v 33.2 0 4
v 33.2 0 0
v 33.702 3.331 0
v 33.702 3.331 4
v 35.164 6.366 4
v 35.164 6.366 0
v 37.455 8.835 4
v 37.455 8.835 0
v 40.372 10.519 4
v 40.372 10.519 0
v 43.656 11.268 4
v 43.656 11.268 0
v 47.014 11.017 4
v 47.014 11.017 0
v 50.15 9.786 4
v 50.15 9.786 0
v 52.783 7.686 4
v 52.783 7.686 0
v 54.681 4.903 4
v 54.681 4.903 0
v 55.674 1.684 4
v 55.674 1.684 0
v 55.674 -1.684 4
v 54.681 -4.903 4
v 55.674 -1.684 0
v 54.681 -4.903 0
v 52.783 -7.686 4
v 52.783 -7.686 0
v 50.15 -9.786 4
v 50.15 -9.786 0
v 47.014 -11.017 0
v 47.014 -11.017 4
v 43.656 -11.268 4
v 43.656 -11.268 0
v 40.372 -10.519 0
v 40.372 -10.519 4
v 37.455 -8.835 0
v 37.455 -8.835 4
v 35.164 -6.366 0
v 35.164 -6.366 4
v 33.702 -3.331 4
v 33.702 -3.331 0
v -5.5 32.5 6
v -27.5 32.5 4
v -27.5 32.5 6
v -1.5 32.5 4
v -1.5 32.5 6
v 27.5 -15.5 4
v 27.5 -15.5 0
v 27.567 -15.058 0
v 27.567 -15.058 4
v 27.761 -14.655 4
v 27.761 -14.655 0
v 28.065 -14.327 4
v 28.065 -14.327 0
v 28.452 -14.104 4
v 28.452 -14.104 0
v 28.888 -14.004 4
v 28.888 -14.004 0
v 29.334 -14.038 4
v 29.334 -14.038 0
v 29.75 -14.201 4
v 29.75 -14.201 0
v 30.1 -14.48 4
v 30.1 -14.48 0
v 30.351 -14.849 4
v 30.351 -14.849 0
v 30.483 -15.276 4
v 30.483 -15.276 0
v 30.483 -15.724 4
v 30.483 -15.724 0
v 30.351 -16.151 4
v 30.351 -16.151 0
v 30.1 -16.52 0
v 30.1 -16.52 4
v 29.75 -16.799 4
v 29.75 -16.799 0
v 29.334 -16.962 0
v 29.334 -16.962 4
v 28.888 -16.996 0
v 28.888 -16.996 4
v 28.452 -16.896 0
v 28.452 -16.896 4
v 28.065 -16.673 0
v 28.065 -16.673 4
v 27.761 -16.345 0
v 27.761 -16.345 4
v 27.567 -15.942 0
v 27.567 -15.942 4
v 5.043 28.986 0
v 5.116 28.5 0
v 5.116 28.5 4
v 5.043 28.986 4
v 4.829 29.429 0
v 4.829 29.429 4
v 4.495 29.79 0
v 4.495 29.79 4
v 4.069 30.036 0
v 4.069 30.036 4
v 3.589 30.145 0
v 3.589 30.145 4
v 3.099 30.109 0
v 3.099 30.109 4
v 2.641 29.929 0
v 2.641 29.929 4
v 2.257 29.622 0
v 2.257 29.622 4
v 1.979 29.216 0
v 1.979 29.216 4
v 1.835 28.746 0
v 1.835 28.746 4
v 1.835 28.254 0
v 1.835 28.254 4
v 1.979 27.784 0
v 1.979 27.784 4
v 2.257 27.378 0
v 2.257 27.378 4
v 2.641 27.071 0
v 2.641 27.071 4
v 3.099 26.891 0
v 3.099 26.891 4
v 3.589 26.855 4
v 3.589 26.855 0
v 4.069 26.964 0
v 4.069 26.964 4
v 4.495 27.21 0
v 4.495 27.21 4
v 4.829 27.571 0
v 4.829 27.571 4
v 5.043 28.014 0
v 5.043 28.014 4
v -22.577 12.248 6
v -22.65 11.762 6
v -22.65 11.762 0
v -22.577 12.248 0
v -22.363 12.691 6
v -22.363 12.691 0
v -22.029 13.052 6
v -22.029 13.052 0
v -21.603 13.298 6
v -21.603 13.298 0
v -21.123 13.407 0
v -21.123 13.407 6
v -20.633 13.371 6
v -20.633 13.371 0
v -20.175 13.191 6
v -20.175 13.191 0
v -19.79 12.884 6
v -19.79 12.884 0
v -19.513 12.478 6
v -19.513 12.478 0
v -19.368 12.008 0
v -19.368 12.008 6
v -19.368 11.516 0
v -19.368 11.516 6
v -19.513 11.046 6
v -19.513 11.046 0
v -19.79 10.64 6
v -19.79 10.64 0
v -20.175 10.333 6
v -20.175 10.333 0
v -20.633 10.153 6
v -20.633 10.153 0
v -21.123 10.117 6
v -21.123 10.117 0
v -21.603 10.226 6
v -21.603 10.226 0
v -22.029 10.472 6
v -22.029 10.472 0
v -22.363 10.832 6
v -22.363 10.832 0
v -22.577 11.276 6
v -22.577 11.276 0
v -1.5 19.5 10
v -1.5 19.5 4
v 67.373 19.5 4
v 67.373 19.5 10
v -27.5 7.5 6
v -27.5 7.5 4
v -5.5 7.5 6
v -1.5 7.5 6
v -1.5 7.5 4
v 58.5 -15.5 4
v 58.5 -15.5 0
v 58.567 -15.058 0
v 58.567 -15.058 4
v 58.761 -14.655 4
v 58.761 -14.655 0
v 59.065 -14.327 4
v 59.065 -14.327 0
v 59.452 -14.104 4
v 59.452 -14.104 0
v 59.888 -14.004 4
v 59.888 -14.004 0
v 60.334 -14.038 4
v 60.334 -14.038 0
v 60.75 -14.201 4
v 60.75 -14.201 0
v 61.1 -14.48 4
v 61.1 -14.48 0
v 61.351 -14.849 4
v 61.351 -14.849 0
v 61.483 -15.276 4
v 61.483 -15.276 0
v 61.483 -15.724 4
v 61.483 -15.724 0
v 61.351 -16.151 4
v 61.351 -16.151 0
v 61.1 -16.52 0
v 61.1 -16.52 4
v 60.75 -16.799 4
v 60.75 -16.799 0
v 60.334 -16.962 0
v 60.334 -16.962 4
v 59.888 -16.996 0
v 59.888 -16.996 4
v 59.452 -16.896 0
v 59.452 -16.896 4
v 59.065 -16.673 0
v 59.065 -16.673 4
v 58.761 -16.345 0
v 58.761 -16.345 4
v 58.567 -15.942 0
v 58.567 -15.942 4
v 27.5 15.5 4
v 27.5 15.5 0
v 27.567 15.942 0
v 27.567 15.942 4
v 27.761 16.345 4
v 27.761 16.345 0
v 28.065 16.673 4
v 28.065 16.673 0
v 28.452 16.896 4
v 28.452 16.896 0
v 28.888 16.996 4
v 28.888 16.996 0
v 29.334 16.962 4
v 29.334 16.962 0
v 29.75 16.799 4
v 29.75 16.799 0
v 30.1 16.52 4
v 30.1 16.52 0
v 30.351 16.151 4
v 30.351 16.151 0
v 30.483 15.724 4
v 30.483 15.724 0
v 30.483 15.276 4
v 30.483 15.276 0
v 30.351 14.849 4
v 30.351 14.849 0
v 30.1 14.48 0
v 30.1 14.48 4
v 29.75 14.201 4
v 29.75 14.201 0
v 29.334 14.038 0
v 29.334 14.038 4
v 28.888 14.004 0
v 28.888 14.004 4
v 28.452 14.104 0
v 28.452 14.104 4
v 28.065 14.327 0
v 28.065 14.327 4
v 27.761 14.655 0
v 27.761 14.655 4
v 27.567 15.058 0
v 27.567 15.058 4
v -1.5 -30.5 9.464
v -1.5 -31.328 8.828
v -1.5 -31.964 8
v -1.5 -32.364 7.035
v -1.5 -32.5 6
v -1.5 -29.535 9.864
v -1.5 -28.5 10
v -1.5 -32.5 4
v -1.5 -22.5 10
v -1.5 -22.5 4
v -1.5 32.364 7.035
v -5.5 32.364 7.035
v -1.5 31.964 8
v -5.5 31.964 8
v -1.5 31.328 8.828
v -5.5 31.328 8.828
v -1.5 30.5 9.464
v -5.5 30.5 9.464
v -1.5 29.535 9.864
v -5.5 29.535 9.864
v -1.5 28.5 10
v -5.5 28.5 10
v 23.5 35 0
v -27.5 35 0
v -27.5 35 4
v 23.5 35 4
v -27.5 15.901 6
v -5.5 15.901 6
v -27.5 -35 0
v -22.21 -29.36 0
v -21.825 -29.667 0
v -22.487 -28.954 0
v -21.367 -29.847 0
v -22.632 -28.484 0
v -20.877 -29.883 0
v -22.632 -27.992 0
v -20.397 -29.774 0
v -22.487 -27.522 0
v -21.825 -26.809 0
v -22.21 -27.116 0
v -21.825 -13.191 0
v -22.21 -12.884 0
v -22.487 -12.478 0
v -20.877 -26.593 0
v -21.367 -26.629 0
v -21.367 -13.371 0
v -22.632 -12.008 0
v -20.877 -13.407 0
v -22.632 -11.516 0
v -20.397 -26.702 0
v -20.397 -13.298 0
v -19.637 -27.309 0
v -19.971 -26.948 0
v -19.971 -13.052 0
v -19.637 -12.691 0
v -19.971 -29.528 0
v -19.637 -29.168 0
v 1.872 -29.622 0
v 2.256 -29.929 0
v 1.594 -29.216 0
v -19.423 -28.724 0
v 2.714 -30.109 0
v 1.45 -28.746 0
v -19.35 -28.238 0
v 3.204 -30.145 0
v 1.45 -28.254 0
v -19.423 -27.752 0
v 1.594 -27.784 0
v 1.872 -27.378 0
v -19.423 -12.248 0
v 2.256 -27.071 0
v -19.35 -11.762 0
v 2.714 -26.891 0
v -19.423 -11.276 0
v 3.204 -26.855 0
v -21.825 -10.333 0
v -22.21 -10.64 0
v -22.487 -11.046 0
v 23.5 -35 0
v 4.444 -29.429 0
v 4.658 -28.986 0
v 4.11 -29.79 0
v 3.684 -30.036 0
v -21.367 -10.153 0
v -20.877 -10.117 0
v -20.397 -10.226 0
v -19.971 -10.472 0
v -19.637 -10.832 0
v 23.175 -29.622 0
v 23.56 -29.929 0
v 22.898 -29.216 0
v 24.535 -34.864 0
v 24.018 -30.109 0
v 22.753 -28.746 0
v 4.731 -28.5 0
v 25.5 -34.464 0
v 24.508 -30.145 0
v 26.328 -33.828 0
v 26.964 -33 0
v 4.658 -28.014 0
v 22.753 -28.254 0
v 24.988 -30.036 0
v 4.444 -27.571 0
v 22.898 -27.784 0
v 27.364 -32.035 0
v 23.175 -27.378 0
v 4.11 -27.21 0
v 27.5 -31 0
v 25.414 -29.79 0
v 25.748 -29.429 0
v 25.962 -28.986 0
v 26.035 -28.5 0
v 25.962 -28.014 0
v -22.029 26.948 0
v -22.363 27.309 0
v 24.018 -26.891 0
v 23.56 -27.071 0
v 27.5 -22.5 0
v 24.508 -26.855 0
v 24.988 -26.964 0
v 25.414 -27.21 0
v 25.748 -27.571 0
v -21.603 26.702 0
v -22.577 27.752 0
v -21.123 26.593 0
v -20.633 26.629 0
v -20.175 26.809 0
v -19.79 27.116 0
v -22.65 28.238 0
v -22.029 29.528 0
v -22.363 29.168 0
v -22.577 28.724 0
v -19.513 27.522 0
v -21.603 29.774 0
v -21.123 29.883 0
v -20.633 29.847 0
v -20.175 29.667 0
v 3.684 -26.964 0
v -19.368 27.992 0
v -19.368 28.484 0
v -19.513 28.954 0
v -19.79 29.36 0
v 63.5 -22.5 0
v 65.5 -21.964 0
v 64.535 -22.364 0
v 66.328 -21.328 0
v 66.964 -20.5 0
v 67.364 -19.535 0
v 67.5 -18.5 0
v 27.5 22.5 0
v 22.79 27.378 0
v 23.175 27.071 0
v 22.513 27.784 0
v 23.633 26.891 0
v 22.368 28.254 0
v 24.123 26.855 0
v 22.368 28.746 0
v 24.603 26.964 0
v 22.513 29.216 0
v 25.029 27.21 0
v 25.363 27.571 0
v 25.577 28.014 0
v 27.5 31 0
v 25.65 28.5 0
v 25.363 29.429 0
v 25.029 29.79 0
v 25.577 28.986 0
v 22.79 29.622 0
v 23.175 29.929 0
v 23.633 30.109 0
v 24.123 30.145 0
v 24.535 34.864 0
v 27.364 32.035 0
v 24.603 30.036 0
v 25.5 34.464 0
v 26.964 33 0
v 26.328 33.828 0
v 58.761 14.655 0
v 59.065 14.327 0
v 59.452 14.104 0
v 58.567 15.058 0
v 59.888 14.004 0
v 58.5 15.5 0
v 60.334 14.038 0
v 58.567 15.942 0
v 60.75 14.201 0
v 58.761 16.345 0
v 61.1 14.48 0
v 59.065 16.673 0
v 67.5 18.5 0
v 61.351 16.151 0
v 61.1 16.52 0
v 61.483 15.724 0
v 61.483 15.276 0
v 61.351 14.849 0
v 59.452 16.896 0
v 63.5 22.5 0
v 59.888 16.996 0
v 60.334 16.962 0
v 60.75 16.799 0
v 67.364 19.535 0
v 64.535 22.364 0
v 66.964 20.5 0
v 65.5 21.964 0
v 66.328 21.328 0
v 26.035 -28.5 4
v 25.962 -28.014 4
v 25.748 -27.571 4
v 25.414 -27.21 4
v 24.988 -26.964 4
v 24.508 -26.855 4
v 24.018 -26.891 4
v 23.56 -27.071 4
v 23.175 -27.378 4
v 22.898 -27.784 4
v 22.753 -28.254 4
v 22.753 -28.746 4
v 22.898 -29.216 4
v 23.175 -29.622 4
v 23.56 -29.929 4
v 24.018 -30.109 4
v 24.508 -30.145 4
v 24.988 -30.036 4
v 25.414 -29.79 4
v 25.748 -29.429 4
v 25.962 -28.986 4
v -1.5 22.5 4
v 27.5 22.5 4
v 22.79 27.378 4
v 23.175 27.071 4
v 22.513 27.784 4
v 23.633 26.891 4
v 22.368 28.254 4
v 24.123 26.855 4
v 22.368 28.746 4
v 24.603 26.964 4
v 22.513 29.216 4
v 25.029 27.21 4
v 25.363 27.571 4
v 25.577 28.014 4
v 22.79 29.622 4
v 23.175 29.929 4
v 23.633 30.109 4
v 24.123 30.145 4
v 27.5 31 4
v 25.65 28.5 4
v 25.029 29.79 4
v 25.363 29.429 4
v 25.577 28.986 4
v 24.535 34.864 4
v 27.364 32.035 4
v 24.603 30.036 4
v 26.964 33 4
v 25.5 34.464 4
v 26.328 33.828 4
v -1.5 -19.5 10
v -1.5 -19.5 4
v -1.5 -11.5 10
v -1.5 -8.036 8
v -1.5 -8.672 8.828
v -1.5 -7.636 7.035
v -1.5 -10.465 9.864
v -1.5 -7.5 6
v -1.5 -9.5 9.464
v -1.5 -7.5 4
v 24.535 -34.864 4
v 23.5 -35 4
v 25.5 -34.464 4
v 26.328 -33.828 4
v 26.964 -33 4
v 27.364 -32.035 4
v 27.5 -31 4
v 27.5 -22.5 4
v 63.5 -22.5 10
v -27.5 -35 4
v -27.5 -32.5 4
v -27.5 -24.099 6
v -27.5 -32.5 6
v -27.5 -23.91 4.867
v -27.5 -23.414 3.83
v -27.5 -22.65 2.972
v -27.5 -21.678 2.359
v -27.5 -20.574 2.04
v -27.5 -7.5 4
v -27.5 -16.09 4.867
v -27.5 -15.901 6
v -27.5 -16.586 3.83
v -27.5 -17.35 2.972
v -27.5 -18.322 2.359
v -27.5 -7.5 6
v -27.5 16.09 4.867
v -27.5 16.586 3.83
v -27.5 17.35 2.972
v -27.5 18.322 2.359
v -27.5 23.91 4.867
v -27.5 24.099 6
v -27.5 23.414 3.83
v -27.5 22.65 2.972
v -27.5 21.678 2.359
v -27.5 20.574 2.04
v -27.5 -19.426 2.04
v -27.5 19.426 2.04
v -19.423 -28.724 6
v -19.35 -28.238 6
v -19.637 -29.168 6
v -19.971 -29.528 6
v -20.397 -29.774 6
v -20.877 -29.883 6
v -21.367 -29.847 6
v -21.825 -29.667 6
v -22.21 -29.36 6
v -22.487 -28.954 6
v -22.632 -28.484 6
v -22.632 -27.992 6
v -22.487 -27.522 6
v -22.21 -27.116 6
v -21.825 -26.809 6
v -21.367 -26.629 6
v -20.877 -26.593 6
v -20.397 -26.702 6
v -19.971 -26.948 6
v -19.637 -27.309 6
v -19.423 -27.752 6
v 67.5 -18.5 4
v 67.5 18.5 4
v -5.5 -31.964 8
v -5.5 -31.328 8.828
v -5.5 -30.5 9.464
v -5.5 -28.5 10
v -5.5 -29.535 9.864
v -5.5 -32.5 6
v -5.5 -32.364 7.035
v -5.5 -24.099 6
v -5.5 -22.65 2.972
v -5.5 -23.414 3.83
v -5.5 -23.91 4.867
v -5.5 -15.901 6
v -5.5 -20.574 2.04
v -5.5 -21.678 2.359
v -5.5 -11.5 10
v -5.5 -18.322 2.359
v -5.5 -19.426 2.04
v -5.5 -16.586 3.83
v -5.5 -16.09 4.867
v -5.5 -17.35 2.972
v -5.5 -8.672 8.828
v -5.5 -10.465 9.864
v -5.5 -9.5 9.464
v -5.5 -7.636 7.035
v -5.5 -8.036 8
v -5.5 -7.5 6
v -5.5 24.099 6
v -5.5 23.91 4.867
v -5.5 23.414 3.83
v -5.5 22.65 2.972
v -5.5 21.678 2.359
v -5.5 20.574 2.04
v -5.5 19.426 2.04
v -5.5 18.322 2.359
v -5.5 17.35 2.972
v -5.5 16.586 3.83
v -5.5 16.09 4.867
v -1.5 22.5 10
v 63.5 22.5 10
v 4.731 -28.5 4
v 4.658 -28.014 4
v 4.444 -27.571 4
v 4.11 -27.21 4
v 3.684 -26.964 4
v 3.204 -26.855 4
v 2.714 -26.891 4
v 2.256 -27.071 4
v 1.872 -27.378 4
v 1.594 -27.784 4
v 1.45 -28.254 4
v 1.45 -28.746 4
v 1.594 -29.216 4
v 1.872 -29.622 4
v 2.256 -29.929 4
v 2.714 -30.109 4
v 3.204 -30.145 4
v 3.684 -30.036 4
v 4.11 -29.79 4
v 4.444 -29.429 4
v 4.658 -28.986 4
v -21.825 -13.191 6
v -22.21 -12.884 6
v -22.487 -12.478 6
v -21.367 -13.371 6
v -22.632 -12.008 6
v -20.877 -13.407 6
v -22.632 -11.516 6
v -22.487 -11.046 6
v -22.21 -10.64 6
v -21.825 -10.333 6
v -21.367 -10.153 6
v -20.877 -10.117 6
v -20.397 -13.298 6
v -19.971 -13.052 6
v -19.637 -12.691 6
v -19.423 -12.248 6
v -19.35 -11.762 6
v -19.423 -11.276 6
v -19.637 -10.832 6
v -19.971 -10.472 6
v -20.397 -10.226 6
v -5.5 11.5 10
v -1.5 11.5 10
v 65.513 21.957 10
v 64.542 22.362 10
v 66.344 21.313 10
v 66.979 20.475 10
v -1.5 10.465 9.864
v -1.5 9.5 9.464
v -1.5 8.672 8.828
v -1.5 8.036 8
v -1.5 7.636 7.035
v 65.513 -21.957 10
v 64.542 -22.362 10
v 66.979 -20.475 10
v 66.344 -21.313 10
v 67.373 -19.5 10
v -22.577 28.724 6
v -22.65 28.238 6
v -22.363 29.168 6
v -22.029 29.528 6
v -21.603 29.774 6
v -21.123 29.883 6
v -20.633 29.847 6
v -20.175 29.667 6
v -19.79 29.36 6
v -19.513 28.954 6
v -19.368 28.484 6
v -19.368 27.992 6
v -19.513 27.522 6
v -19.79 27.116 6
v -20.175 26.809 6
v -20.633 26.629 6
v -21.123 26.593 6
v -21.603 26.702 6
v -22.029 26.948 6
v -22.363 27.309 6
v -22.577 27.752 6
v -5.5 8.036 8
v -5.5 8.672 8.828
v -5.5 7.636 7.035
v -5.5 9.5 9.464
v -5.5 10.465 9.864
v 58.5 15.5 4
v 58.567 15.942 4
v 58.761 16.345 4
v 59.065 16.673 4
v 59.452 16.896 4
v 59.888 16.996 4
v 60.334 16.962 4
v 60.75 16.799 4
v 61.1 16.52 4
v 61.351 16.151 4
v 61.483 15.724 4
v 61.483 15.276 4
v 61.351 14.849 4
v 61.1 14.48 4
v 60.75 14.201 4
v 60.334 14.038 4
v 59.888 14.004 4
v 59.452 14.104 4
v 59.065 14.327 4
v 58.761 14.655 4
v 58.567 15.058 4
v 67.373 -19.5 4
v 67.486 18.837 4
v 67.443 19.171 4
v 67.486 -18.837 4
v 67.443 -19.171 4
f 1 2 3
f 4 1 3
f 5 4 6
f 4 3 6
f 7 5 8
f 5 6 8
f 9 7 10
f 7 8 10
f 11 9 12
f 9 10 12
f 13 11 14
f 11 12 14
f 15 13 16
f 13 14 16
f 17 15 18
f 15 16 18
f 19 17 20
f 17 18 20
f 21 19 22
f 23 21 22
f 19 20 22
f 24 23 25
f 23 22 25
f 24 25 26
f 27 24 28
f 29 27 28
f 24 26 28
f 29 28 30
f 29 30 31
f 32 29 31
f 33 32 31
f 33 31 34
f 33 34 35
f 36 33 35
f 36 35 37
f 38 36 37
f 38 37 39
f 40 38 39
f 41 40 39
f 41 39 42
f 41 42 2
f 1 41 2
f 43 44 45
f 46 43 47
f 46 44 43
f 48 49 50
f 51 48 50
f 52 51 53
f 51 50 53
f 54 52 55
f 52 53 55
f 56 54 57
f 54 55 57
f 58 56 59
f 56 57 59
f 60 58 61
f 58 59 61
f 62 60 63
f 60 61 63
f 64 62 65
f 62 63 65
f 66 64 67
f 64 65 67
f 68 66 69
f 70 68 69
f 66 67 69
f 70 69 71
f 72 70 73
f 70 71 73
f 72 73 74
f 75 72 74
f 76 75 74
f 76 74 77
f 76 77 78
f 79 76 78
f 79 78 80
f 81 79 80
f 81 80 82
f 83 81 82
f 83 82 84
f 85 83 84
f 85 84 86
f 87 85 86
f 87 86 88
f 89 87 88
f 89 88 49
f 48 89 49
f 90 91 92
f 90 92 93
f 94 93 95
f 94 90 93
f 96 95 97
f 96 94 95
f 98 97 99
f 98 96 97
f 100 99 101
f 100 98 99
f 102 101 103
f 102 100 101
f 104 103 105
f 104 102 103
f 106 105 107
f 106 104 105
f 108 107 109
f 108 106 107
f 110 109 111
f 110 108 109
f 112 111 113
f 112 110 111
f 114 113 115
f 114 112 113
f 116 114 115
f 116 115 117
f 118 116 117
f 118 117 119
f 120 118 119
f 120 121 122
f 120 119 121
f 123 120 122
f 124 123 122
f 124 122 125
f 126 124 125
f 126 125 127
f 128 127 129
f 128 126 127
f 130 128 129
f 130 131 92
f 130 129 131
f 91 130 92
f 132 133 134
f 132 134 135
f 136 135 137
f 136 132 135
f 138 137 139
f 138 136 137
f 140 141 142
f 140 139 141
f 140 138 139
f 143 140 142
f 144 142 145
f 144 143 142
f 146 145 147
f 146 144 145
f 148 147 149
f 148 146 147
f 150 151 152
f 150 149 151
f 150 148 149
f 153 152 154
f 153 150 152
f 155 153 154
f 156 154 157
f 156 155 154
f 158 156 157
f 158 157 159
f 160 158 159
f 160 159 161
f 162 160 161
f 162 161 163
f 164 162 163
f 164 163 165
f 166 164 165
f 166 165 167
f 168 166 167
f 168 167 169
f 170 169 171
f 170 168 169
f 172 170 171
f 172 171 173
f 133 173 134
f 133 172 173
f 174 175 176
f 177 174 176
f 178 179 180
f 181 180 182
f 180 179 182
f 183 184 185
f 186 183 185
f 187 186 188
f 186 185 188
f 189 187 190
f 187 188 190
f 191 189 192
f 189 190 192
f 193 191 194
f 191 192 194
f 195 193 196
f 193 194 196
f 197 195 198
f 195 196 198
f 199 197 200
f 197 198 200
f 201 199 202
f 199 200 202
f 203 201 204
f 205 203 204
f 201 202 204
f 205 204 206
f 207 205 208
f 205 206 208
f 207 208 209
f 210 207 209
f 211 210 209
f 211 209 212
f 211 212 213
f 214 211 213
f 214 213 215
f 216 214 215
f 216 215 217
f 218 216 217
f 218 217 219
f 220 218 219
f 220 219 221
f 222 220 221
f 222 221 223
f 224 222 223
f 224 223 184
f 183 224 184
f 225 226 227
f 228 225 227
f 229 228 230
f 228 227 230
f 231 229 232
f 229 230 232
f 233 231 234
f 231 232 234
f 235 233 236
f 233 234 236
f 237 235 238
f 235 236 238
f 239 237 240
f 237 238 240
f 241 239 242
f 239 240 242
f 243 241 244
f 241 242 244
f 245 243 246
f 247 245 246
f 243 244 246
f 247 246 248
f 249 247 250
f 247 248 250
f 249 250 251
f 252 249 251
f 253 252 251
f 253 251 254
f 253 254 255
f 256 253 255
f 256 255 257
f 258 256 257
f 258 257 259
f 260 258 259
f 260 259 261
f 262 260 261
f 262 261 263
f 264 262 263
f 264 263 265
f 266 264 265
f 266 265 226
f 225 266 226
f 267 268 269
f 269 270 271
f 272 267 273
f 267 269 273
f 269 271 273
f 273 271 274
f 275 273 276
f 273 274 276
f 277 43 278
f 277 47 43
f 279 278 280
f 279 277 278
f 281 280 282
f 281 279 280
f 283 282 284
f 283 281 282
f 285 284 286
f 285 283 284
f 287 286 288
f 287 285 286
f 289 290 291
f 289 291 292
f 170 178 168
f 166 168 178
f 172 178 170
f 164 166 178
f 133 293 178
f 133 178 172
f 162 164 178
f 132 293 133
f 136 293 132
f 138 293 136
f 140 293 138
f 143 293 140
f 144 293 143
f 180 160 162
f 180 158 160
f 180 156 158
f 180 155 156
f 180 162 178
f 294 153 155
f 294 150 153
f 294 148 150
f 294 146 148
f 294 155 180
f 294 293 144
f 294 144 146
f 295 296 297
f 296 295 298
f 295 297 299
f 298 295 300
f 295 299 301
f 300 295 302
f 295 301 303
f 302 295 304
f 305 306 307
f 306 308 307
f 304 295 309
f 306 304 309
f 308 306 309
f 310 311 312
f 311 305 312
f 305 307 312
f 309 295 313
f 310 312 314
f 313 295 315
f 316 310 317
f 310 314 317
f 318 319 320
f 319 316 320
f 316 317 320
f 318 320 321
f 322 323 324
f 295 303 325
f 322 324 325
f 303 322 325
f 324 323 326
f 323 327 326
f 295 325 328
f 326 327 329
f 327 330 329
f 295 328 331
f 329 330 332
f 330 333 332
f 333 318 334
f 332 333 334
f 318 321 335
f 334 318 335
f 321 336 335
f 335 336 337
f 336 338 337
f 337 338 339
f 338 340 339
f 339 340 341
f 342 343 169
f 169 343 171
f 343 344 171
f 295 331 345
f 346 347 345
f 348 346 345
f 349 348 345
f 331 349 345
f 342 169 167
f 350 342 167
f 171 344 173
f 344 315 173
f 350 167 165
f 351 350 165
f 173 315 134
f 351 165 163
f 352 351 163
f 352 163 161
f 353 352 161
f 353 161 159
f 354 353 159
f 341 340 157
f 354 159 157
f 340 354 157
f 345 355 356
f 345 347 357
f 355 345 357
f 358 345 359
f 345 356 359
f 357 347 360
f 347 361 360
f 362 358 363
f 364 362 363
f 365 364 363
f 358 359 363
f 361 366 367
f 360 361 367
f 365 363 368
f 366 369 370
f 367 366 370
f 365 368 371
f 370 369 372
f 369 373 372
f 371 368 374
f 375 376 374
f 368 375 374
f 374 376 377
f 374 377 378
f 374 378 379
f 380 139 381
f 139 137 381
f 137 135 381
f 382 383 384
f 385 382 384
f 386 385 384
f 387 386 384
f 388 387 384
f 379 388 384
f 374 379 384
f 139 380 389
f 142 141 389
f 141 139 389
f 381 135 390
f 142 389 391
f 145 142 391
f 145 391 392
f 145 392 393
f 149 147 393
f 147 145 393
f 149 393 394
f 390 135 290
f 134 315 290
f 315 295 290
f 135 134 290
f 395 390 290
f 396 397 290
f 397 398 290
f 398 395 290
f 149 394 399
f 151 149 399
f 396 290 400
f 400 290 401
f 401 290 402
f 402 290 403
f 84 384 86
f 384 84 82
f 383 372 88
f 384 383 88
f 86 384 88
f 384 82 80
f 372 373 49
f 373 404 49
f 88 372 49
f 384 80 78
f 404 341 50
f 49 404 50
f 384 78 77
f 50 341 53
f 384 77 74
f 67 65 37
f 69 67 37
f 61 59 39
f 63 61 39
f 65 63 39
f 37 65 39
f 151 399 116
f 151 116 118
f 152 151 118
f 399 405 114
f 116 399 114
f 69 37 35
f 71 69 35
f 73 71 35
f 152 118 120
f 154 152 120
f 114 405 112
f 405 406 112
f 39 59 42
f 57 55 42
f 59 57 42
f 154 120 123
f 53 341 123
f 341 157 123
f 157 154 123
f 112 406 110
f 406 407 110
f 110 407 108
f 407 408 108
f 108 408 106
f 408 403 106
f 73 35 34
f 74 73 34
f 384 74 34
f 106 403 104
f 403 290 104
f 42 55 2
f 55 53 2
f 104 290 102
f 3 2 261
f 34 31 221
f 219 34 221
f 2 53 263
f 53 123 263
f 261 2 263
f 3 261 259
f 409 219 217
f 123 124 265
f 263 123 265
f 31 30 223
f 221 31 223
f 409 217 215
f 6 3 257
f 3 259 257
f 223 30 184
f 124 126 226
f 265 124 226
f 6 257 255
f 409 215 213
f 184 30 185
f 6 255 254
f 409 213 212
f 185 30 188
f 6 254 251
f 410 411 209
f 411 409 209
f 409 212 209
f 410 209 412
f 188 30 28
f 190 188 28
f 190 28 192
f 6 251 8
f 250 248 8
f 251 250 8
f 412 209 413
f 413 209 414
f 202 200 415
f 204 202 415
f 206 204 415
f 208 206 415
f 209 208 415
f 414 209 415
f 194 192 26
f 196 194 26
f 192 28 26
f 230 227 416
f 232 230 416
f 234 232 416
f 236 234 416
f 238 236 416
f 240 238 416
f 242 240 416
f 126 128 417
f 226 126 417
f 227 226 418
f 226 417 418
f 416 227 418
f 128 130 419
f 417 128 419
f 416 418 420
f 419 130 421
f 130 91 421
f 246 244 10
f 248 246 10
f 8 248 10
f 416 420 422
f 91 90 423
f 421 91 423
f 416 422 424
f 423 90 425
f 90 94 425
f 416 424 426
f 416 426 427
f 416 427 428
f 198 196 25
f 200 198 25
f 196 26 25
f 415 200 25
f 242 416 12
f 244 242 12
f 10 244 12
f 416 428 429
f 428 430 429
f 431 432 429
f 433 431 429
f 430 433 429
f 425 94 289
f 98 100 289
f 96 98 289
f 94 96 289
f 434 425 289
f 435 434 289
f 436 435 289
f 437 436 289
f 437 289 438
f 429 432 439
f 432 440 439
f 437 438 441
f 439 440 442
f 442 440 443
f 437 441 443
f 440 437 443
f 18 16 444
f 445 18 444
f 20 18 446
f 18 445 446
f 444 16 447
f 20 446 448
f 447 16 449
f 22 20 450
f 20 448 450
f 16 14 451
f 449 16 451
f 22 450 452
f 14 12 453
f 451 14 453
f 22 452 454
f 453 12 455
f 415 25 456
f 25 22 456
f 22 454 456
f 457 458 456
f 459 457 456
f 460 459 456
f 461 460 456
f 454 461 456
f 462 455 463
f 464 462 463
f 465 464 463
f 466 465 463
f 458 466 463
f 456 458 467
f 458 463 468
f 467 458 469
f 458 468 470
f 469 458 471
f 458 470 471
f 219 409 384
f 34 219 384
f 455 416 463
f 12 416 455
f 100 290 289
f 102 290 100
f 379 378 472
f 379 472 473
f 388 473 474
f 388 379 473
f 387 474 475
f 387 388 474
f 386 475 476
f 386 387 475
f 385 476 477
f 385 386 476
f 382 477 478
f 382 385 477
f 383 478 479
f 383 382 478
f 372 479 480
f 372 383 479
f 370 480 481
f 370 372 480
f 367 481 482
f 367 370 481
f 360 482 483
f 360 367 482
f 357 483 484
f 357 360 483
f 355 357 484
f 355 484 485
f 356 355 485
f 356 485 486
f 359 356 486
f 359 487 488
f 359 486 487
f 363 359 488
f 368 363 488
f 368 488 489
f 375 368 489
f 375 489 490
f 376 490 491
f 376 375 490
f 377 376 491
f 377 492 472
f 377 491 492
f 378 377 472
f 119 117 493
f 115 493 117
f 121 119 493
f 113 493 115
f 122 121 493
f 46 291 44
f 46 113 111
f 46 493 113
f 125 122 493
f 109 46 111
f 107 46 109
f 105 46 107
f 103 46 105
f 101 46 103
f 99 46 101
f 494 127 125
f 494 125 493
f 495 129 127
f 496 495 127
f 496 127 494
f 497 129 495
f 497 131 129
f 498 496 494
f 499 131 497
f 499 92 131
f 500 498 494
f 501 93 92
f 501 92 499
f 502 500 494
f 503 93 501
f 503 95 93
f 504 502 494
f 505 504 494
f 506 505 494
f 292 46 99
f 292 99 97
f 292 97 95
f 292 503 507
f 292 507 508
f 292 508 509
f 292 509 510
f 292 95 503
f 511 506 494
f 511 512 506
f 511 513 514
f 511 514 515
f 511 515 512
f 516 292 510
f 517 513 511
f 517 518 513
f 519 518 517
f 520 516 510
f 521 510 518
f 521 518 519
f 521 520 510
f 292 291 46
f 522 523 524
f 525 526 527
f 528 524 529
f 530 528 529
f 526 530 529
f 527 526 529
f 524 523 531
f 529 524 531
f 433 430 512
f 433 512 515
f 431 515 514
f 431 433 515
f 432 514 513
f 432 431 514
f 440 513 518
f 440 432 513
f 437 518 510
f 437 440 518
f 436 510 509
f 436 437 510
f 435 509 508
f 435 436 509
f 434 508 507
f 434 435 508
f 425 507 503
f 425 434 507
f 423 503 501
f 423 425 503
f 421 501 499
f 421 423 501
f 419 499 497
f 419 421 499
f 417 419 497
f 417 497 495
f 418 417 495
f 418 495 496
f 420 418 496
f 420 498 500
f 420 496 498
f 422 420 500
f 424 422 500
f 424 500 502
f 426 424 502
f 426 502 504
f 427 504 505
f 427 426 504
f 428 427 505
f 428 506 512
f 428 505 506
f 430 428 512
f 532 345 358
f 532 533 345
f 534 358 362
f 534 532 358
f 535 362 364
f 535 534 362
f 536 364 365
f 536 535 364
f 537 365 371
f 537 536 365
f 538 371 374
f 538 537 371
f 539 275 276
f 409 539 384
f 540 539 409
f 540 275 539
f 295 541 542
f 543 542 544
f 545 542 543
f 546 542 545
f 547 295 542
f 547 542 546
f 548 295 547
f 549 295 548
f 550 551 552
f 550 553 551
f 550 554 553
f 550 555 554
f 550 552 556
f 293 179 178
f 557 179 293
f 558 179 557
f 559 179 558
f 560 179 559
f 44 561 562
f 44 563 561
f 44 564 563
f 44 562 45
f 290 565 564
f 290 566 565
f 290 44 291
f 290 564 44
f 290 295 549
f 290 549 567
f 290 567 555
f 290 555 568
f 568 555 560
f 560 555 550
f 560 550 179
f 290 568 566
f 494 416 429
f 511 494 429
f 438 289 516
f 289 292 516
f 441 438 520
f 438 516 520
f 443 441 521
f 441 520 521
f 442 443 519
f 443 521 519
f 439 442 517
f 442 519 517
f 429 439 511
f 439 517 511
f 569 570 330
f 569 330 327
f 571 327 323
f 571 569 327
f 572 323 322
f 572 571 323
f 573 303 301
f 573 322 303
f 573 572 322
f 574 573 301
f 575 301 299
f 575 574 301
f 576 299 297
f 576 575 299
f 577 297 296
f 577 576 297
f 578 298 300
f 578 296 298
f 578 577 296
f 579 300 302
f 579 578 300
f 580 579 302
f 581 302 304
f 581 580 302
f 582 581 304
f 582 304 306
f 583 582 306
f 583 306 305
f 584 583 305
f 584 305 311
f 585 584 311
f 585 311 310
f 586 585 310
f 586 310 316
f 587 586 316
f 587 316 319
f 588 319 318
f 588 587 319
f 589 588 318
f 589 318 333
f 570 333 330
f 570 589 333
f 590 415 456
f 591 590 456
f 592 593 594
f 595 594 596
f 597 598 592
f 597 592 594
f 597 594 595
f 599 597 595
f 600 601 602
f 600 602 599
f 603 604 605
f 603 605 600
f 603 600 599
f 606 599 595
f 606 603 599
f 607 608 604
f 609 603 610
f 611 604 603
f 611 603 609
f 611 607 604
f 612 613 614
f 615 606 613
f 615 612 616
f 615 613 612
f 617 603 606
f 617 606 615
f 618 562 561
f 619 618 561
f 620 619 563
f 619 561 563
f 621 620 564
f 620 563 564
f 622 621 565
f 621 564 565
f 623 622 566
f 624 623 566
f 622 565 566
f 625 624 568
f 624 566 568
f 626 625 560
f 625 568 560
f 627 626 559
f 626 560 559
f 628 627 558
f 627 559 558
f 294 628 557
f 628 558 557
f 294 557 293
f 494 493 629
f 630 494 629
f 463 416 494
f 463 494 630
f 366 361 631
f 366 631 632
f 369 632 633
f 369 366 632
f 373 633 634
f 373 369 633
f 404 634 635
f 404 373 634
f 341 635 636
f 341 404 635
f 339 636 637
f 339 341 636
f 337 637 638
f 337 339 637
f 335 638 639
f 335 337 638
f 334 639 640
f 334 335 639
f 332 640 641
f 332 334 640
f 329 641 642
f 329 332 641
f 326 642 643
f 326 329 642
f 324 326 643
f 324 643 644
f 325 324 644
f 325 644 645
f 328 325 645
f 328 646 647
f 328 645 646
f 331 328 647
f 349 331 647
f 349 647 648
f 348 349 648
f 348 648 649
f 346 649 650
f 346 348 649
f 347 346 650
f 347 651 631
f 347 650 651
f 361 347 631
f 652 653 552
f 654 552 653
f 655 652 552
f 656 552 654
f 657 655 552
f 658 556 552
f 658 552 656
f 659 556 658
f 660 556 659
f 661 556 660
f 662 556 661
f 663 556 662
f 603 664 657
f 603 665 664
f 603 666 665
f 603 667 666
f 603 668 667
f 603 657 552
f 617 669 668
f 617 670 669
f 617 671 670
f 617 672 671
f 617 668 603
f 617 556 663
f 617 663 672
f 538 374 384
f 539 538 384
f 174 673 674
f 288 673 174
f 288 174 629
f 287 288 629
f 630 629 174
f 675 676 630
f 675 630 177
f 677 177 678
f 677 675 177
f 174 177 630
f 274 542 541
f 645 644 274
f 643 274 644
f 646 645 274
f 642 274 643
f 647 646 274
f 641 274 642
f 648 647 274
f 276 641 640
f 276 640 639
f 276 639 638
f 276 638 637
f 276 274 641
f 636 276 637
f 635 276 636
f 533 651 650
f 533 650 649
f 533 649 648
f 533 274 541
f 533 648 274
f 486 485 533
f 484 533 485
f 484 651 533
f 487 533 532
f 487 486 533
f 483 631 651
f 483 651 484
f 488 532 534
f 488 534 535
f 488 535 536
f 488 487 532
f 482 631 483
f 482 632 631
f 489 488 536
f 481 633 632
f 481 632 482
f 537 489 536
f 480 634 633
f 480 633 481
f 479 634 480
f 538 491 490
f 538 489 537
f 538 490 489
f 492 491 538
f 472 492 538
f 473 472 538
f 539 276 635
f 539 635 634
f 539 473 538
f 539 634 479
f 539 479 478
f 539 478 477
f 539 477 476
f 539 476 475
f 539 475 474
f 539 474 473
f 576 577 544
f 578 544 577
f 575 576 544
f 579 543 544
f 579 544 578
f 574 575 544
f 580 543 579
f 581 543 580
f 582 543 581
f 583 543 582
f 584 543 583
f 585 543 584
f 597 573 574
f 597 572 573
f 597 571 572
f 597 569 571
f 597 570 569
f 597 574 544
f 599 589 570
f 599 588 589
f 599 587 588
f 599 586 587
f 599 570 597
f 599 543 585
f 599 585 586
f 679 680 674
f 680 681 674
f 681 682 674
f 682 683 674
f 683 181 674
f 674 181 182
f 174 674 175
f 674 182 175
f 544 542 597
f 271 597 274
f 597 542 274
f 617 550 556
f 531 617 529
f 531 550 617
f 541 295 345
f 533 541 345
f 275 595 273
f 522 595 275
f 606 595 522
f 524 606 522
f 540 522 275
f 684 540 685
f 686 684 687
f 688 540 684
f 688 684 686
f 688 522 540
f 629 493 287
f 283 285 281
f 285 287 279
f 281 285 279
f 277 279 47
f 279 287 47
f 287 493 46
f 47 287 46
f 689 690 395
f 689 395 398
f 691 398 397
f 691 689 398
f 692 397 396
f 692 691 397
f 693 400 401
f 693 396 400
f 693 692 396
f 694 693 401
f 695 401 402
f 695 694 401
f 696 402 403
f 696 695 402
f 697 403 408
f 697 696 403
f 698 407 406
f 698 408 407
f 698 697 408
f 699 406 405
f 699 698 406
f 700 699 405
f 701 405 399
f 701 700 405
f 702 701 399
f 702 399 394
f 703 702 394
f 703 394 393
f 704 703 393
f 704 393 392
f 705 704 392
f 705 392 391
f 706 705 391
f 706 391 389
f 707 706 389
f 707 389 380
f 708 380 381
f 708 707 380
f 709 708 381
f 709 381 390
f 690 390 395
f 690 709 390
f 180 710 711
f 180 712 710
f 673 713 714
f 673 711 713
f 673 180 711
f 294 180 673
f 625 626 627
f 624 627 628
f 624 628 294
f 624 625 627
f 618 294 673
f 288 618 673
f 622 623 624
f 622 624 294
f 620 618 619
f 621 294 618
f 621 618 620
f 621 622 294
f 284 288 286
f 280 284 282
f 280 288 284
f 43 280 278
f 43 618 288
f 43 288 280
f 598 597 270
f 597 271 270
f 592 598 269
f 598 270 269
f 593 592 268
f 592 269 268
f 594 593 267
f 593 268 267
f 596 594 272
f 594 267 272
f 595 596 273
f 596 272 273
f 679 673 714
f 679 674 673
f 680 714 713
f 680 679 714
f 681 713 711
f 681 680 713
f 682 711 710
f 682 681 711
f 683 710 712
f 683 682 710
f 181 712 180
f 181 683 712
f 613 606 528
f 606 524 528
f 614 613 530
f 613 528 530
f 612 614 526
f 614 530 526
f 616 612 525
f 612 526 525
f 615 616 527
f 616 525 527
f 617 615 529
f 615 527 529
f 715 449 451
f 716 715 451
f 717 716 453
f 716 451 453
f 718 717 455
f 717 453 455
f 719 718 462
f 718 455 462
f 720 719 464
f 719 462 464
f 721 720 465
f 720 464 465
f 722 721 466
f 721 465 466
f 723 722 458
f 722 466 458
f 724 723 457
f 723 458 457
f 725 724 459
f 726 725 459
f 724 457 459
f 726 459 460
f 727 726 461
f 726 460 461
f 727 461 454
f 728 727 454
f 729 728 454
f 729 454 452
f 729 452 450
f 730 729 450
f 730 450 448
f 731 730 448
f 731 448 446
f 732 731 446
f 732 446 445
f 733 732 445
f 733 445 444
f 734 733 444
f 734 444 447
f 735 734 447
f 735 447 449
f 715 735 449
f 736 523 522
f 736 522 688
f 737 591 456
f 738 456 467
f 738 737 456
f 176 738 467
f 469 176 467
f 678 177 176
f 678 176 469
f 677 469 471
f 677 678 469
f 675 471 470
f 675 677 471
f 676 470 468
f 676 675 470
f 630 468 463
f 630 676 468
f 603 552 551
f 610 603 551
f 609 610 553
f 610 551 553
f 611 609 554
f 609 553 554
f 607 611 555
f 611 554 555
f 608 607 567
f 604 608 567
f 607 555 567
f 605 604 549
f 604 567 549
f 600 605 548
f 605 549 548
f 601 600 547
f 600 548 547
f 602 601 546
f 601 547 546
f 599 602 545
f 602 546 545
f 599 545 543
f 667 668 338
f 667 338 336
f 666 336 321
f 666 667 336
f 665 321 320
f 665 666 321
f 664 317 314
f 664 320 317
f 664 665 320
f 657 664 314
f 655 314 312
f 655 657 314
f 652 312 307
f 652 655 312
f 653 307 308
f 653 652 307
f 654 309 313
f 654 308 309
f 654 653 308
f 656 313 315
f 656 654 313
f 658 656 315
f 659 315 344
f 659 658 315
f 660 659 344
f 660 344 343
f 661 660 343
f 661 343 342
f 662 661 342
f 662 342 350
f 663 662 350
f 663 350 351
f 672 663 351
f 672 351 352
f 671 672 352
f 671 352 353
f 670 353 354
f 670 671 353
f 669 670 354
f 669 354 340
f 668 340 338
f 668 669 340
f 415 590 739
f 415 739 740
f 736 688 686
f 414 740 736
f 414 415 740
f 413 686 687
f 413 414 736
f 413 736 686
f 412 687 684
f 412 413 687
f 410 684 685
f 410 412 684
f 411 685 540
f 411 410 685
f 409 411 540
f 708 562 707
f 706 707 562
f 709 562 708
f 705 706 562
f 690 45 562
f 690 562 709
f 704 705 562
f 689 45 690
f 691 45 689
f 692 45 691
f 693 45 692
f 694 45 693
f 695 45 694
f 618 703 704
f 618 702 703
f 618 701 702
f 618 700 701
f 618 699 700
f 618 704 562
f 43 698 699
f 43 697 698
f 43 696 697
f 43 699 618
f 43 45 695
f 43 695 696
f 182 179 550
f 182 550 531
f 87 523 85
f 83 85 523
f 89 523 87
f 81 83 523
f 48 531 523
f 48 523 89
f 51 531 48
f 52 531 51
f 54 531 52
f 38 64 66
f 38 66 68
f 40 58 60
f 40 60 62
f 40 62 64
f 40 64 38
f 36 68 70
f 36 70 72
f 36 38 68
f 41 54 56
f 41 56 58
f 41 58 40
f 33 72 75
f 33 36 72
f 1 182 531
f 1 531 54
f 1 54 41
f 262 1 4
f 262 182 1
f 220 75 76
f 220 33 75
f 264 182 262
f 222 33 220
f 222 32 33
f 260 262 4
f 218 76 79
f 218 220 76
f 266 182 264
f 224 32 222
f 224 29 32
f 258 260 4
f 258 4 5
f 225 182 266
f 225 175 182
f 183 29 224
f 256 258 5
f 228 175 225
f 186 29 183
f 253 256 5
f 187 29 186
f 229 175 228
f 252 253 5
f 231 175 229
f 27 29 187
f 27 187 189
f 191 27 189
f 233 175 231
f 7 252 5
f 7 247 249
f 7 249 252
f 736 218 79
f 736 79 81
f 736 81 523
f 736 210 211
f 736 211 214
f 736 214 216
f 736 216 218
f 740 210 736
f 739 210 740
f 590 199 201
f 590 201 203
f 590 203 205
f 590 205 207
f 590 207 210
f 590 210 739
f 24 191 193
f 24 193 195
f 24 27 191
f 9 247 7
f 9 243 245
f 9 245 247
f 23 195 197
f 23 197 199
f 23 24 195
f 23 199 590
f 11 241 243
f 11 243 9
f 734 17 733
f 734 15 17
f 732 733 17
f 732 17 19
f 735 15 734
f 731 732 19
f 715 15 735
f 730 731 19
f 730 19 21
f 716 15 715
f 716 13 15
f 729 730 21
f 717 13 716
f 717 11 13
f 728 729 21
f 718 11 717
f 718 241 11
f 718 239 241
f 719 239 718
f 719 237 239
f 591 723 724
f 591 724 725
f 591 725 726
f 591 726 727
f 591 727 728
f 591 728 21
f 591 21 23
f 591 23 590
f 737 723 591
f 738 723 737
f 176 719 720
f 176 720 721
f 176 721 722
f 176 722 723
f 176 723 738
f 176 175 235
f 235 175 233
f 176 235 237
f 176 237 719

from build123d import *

# Parameters (mm, degrees)
SKETCH1_W               = 55
SKETCH1_H               = 70
BOSS_EXTRUDE1_DEPTH     = 4
SKETCH4_W               = 26
SKETCH4_H               = 25
BOSS_EXTRUDE2_DEPTH     = 2
SKETCH3_R               = 4.1
CUT_EXTRUDE1_DEPTH      = 22
SKETCH5_W               = 40
SKETCH5_H               = 45
BOSS_EXTRUDE3_DEPTH     = 4
SKETCH7_R               = 11.3
SKETCH7_R_2             = 1.5
CUT_EXTRUDE2_DEPTH      = 77.270898775
FILLET1_R               = 4
SKETCH8_W               = 4
SKETCH8_H               = 25
BOSS_EXTRUDE4_DEPTH     = 4
FILLET2_R               = 4
SKETCH10_W              = 69
SKETCH10_H              = 3
BOSS_EXTRUDE5_DEPTH     = 6
CUT_EXTRUDE4_DEPTH      = 77.270898775
CUT_EXTRUDE4_DEPTH_BACK = 77.270898775
SKETCH12_R              = 1.65
CUT_EXTRUDE5_DEPTH      = 77.689308251
CUT_EXTRUDE5_DEPTH_BACK = 77.689308251
SKETCH13_R              = 1.65
FILLET3_R               = 4


with BuildPart() as part:
    # Sketch1 → Boss-Extrude1 (new body)
    with BuildSketch(Plane.XY):
        Rectangle(SKETCH1_W, SKETCH1_H)
    extrude(amount=BOSS_EXTRUDE1_DEPTH)

    # Sketch4 → Boss-Extrude2 (add)
    with BuildSketch(Plane.XY.offset(4)):
        with Locations((-14.5, 20)):
            Rectangle(SKETCH4_W, SKETCH4_H)
        with Locations((-14.5, -20)):
            Rectangle(SKETCH4_W, SKETCH4_H)
    extrude(amount=BOSS_EXTRUDE2_DEPTH)

    # Sketch3 → Cut-Extrude1 (cut)
    with BuildSketch(Plane.ZY.offset(27.5)):
        with Locations((6.1, 20)):
            Circle(SKETCH3_R)
        with Locations((6.1, -20)):
            Circle(SKETCH3_R)
    extrude(amount=-CUT_EXTRUDE1_DEPTH, mode=Mode.SUBTRACT)

    # Sketch5 → Boss-Extrude3 (add)
    with BuildSketch(Plane.XY.offset(4)):
        with Locations((47.5, 0)):
            Rectangle(SKETCH5_W, SKETCH5_H)
    extrude(amount=-BOSS_EXTRUDE3_DEPTH)

    # Sketch7 → Cut-Extrude2 (cut, through all)
    with BuildSketch(Plane(origin=(0, 0, 0), x_dir=(-1, 0, 0), z_dir=(0, 0, -1))):
        with Locations((-44.5, 0)):
            Circle(SKETCH7_R)
        with Locations((-60, 15.5)):
            Circle(SKETCH7_R_2)
        with Locations((-29, 15.5)):
            Circle(SKETCH7_R_2)
        with Locations((-29, -15.5)):
            Circle(SKETCH7_R_2)
        with Locations((-60, -15.5)):
            Circle(SKETCH7_R_2)
    extrude(amount=-CUT_EXTRUDE2_DEPTH, mode=Mode.SUBTRACT)

    # Fillet1
    fillet1_edges = [part.edges().sort_by_distance(p)[0] for p in [
        (27.5, -35, 2),
        (27.5, 35, 2),
    ]]
    fillet(fillet1_edges, radius=FILLET1_R)

    # Sketch8 → Boss-Extrude4 (add)
    with BuildSketch(Plane.XY.offset(6)):
        with Locations((-3.5, 20)):
            Rectangle(SKETCH8_W, SKETCH8_H)
        with Locations((-3.5, -20)):
            Rectangle(SKETCH8_W, SKETCH8_H)
    extrude(amount=BOSS_EXTRUDE4_DEPTH)

    # Fillet2
    fillet2_edges = [part.edges().sort_by_distance(p)[0] for p in [
        (-3.5, -32.5, 10),
        (-3.5, -7.5, 10),
        (-3.5, 32.5, 10),
        (-3.5, 7.5, 10),
    ]]
    fillet(fillet2_edges, radius=FILLET2_R)

    # Sketch10 → Boss-Extrude5 (add)
    with BuildSketch(Plane.XY.offset(4)):
        with Locations((33, 21)):
            Rectangle(SKETCH10_W, SKETCH10_H)
        with Locations((33, -21)):
            Rectangle(SKETCH10_W, SKETCH10_H)
    extrude(amount=BOSS_EXTRUDE5_DEPTH)

    # Sketch12 → Cut-Extrude4 (cut, two sides: drawn at the far end of the back side and taken through both)
    with BuildSketch(Plane.XY.offset(4).offset(-CUT_EXTRUDE4_DEPTH_BACK)):
        with Locations((3.466076719, 28.5)):
            Circle(SKETCH12_R)
        with Locations((24, 28.5)):
            Circle(SKETCH12_R)
        with Locations((24.385, -28.5)):
            Circle(SKETCH12_R)
        with Locations((3.081076719, -28.5)):
            Circle(SKETCH12_R)
    extrude(amount=CUT_EXTRUDE4_DEPTH + CUT_EXTRUDE4_DEPTH_BACK, mode=Mode.SUBTRACT)

    # Sketch13 → Cut-Extrude5 (cut, two sides: drawn at the far end of the back side and taken through both)
    with BuildSketch(Plane(origin=(0, 0, 0), x_dir=(-1, 0, 0), z_dir=(0, 0, -1)).offset(-CUT_EXTRUDE5_DEPTH_BACK)):
        with Locations(Location((21, -11.761910465, 0), (0, 0, 180))):
            Circle(SKETCH13_R)
        with Locations(Location((21, -28.238089535, 0), (0, 0, 180))):
            Circle(SKETCH13_R)
        with Locations((21, 28.238089535)):
            Circle(SKETCH13_R)
        with Locations((21, 11.761910465)):
            Circle(SKETCH13_R)
    extrude(amount=CUT_EXTRUDE5_DEPTH + CUT_EXTRUDE5_DEPTH_BACK, mode=Mode.SUBTRACT)

    # Fillet3
    fillet3_edges = [part.edges().sort_by_distance(p)[0] for p in [
        (67.5, 22.5, 5),
        (67.5, -22.5, 5),
    ]]
    fillet(fillet3_edges, radius=FILLET3_R)


solid = part.part
